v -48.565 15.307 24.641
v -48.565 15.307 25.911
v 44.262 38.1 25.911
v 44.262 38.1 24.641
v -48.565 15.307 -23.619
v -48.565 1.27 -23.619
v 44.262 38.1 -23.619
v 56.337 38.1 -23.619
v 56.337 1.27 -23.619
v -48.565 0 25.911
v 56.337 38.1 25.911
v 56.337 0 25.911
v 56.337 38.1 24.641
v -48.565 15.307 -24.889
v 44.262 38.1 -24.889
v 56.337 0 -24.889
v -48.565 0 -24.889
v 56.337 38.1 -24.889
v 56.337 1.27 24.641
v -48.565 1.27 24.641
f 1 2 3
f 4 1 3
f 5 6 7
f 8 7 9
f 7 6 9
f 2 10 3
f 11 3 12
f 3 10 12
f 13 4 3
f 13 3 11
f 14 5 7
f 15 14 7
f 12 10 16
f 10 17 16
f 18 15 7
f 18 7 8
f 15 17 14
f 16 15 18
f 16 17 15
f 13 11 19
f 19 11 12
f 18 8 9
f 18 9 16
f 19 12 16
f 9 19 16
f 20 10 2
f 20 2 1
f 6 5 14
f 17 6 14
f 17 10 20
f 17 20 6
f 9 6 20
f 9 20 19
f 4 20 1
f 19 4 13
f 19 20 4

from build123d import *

# Parameters (mm, degrees)
SKETCH1_W           = 104.902
SKETCH1_H           = 48.26
BOSS_EXTRUDE1_DEPTH = 1.27
SKETCH1_3_W         = 104.902
SKETCH1_3_H         = 1.27
BOSS_EXTRUDE2_DEPTH = 38.1
CUT_EXTRUDE1_DEPTH  = 53.34


with BuildPart() as part:
    # Sketch1 → Boss-Extrude1 (new body)
    with BuildSketch(Plane(origin=(0, 0, 0), x_dir=(1, 0, 0), z_dir=(0, 1, 0))):
        with Locations((3.8862, -0.511112371)):
            Rectangle(SKETCH1_W, SKETCH1_H)
    extrude(amount=BOSS_EXTRUDE1_DEPTH)

    # Sketch1<3> → Boss-Extrude2 (add)
    with BuildSketch(Plane(origin=(0, 0, 0), x_dir=(1, 0, 0), z_dir=(0, 1, 0))):
        with Locations((3.8862, -25.276112371)):
            Rectangle(SKETCH1_3_W, SKETCH1_3_H)
        with Locations((3.8862, 24.253887629)):
            Rectangle(SKETCH1_3_W, SKETCH1_3_H)
    extrude(amount=BOSS_EXTRUDE2_DEPTH)

    # Sketch2 → Cut-Extrude1 (cut)
    with BuildSketch(Plane.XY.offset(25.911112371)):
        Polygon((-48.5648, 15.307256031), (44.262468269, 38.1), (-48.5648, 38.1), align=None)
    extrude(amount=-CUT_EXTRUDE1_DEPTH, mode=Mode.SUBTRACT)


solid = part.part
